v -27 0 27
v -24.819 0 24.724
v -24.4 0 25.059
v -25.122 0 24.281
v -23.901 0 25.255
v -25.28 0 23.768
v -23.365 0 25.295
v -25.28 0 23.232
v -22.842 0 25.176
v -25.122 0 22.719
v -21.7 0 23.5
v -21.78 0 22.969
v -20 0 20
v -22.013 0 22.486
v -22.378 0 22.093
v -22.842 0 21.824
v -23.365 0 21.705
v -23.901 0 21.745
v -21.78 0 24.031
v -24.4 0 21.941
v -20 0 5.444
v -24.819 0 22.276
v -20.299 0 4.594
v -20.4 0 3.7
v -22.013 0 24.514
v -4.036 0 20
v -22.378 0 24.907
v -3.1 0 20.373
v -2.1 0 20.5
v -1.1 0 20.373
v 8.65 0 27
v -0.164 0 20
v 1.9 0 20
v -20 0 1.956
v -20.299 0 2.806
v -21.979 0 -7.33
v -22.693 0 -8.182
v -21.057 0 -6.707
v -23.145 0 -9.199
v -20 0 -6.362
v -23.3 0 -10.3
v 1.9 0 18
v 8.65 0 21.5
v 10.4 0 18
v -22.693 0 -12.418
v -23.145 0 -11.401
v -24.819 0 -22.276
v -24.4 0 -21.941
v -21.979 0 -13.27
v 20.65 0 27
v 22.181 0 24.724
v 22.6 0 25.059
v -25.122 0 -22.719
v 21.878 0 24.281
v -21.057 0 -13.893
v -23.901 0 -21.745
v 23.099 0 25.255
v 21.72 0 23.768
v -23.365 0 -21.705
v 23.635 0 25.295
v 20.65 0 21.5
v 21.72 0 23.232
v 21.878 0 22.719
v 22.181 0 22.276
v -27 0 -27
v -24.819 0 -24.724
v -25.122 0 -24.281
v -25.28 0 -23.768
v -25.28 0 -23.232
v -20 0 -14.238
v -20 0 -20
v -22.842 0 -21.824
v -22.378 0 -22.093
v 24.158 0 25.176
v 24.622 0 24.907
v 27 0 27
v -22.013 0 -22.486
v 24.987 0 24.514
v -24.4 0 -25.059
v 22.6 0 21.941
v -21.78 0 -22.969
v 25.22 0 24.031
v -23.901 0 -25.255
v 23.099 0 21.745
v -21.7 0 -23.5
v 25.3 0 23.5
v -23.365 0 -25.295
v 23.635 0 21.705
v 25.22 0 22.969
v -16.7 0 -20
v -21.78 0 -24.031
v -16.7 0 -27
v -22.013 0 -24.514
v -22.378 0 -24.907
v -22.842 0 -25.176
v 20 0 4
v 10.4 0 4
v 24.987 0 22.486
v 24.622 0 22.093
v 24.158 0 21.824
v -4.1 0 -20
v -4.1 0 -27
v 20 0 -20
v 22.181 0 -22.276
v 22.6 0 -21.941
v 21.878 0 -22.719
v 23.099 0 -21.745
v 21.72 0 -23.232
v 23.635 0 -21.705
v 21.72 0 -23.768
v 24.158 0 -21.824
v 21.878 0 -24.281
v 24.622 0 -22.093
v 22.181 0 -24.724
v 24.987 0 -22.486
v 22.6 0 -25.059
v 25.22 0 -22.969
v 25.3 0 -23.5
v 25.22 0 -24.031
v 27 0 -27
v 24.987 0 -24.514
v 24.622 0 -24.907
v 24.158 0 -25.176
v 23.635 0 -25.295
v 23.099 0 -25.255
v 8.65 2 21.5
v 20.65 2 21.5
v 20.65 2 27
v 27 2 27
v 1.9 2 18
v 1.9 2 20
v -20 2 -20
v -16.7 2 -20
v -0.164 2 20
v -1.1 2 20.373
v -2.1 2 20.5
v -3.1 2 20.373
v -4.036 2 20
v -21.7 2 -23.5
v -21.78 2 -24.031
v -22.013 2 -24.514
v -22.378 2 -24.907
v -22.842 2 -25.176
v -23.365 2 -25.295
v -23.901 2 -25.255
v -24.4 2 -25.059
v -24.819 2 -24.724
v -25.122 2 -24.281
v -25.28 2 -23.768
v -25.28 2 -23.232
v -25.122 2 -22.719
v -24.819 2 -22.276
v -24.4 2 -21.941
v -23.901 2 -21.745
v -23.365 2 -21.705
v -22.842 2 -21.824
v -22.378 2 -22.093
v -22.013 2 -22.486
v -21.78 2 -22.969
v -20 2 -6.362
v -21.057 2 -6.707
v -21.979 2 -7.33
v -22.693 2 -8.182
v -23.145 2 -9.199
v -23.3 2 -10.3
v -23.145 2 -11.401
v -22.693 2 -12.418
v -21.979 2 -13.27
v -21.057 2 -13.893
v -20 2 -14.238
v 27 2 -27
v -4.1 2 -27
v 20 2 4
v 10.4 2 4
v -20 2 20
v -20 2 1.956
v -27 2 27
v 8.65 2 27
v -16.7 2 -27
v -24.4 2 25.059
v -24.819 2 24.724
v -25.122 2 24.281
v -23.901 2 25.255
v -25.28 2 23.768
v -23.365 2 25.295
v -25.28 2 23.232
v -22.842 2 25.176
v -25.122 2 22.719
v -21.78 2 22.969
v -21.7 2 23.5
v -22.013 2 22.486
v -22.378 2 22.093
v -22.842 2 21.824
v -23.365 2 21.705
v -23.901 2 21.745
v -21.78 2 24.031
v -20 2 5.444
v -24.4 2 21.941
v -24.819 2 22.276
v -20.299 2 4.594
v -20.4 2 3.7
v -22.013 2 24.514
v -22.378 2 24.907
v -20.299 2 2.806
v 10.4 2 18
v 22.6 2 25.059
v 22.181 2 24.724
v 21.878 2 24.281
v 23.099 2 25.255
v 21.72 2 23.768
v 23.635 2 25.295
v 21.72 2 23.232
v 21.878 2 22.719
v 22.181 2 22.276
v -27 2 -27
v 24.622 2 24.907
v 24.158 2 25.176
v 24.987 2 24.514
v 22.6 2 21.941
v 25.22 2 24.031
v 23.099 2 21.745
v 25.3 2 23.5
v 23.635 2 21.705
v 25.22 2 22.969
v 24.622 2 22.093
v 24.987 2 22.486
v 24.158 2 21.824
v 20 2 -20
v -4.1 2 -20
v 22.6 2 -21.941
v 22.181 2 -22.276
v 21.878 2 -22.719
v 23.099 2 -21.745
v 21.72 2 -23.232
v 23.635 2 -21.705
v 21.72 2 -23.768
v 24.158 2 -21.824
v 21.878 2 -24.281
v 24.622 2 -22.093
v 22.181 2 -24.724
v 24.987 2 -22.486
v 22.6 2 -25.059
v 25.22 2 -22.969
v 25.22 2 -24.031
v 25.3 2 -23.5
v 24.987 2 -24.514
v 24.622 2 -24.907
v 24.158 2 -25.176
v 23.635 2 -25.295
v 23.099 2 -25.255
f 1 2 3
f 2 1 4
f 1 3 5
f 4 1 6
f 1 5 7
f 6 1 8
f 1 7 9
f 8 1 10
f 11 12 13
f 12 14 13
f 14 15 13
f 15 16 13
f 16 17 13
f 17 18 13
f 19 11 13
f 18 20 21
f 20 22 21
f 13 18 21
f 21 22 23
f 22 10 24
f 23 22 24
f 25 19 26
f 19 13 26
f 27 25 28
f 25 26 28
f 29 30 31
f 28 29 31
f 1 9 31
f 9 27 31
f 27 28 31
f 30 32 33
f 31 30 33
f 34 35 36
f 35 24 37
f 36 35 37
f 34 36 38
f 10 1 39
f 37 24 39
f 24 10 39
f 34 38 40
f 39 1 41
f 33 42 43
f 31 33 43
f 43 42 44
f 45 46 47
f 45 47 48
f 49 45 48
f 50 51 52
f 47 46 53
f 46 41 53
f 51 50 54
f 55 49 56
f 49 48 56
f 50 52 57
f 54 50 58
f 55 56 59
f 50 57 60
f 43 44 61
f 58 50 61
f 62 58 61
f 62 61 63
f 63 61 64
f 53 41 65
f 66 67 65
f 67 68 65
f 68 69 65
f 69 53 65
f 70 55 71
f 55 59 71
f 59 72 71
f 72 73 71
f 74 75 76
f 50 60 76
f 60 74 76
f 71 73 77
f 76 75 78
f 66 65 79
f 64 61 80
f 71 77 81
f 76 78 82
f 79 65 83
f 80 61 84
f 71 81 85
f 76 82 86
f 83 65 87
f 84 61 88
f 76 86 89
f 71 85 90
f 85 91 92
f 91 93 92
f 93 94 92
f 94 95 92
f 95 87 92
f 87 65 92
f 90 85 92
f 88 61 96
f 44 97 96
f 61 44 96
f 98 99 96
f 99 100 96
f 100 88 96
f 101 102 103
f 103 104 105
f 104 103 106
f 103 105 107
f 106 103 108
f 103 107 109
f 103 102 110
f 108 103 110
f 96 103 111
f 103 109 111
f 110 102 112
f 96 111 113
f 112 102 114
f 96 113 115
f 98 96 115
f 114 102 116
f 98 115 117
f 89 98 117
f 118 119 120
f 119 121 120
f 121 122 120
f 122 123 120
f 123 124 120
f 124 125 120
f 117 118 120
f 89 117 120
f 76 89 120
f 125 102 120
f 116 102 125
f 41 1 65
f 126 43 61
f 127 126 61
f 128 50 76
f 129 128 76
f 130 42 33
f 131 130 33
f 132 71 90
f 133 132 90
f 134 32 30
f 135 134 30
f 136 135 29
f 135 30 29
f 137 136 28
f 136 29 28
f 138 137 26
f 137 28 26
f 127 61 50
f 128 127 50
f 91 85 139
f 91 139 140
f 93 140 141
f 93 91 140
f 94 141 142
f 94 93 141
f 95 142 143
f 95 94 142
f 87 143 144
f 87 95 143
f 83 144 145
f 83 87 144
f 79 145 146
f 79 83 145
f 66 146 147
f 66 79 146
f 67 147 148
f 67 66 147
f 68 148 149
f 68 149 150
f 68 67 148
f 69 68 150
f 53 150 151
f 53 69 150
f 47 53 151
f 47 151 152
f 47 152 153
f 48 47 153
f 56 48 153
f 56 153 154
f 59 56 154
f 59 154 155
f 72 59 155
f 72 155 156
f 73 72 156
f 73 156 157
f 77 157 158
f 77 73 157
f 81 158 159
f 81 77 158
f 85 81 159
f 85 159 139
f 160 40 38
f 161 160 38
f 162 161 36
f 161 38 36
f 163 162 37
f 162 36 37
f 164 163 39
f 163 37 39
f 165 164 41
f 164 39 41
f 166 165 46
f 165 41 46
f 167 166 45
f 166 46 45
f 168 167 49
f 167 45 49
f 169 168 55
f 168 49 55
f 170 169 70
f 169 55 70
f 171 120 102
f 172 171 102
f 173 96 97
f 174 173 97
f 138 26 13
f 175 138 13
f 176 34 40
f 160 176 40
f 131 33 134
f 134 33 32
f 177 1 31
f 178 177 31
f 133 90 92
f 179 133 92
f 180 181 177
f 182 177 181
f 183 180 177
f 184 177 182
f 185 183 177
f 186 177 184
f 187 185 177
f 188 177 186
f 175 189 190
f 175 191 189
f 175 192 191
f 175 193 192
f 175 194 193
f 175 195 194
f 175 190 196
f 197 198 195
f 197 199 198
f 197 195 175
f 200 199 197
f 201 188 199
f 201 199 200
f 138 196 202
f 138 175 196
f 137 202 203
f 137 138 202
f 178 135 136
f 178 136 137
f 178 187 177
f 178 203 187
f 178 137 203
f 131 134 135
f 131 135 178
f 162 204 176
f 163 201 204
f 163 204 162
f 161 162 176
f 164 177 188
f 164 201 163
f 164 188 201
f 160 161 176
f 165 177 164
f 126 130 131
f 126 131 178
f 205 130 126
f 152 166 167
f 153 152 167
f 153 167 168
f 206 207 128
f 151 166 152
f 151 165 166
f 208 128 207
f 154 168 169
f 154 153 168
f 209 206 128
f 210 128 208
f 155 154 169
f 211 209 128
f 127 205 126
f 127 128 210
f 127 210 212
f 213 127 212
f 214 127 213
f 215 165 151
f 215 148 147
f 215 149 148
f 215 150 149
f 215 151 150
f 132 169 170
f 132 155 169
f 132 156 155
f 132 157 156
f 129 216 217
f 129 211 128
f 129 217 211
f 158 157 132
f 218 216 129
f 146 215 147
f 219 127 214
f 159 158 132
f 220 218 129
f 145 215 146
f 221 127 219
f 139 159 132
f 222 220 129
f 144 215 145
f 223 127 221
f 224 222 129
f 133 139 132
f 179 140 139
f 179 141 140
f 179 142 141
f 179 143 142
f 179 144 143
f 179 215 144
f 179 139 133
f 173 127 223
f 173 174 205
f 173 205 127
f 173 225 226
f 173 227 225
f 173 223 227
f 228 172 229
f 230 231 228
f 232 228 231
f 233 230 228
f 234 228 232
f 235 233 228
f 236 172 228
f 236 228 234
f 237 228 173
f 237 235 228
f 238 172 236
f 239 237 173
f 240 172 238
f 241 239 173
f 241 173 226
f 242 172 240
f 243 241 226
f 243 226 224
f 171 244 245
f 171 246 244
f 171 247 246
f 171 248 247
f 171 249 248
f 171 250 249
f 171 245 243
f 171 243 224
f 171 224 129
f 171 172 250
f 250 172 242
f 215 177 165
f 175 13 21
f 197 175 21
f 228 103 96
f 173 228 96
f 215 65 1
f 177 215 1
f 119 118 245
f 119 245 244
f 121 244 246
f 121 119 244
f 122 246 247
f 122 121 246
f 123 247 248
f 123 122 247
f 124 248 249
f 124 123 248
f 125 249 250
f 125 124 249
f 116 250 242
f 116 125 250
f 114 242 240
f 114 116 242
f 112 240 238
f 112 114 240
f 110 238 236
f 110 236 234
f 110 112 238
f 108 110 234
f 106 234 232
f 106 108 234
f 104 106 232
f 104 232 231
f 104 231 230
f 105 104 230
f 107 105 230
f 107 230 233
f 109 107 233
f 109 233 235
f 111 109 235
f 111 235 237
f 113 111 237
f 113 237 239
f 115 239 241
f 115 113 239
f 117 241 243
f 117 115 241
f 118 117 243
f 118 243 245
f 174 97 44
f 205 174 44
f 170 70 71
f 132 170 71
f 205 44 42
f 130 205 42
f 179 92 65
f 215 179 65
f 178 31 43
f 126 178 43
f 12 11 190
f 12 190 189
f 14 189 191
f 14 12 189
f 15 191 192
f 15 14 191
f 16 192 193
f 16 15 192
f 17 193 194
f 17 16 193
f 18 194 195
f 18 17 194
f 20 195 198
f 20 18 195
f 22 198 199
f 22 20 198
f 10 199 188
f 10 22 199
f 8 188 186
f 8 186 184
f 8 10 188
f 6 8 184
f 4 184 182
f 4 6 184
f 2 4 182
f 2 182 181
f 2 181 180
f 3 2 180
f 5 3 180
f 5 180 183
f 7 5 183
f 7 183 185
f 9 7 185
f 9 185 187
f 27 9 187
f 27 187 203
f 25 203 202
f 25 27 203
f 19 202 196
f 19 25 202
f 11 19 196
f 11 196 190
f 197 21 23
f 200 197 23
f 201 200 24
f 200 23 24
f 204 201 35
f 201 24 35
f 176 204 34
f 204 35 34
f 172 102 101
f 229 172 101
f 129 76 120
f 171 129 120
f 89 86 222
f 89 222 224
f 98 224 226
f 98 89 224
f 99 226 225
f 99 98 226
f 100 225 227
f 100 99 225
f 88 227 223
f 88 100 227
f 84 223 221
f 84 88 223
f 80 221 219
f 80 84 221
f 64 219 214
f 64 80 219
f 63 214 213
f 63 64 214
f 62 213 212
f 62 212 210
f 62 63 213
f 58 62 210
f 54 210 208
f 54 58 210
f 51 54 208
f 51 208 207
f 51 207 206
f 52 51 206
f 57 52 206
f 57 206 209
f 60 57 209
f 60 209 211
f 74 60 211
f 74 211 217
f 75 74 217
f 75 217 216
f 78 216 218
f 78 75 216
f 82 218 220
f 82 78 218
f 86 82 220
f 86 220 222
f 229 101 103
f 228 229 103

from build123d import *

# Parameters (mm, degrees)
SKETCH_3_R      = 1.8
SKETCH_3_W      = 0.8
SKETCH_3_H      = 1.5
SKETCH_3_W_2    = 1
EXTRUDE_2_DEPTH = 2


with BuildPart() as part:
    # 草图3 → 凸台-拉伸2 (new body)
    with BuildSketch(Plane(origin=(0, 0, 0), x_dir=(1, 0, 0), z_dir=(0, 1, 0))):
        with BuildLine():
            Line((8.65, -27), (8.65, -21.5))
            Line((8.65, -21.5), (8.65, -20))
            Line((8.65, -20), (1.9, -20))
            Line((1.9, -20), (-0.163508327, -20))
            ThreePointArc((-0.163508327, -20), (-2.1, -20.5), (-4.036491673, -20))
            Line((-4.036491673, -20), (-20, -20))
            Line((-20, -20), (-20, -5.443559577))
            ThreePointArc((-20, -5.443559577), (-20.4, -3.7), (-20, -1.956440423))
            Line((-20, -1.956440423), (-20, 6.361726266))
            ThreePointArc((-20, 6.361726266), (-23.3, 10.3), (-20, 14.238273734))
            Line((-20, 14.238273734), (-20, 20))
            Line((-20, 20), (-16.7, 20))
            Line((-16.7, 20), (-16.7, 27))
            Line((-16.7, 27), (-27, 27))
            Line((-27, 27), (-27, -27))
            Line((-27, -27), (8.65, -27))
        make_face()
        with Locations((-23.5, -23.5)):
            Circle(SKETCH_3_R, mode=Mode.SUBTRACT)
        with Locations((-23.5, 23.5)):
            Circle(SKETCH_3_R, mode=Mode.SUBTRACT)
        Polygon((20, -18), (20, -20), (20.65, -20), (20.65, -21.5), (20.65, -27), (27, -27), (27, 27), (-4.1, 27), (-4.1, 20), (20, 20), (20, -4), align=None)
        with Locations((23.5, -23.5)):
            Circle(SKETCH_3_R, mode=Mode.SUBTRACT)
        with Locations((23.5, 23.5)):
            Circle(SKETCH_3_R, mode=Mode.SUBTRACT)
        Polygon((12.4, -20), (12.4, -19.5), (12.4, -18), (10.4, -18), (1.9, -18), (1.9, -20), (8.65, -20), align=None)
        Polygon((20, -20), (16.9, -20), (16.9, -19.5), (16.1, -19.5), (13.4, -19.5), (12.4, -19.5), (12.4, -20), (8.65, -20), (8.65, -21.5), (20.65, -21.5), (20.65, -20), align=None)
        Polygon((16.9, -19.5), (16.9, -20), (20, -20), (20, -18), (16.9, -18), align=None)
        with Locations((16.5, -18.75)):
            Rectangle(SKETCH_3_W, SKETCH_3_H)
        with Locations((12.9, -18.75)):
            Rectangle(SKETCH_3_W_2, SKETCH_3_H)
        Polygon((16.1, -18), (16.9, -18), (16.9, -6), (12.4, -6), (12.4, -18), (13.4, -18), (13.4, -19.5), (16.1, -19.5), align=None)
        Polygon((16.9, -18), (20, -18), (20, -4), (10.4, -4), (10.4, -6), (10.4, -18), (12.4, -18), (12.4, -6), (16.9, -6), align=None)
    extrude(amount=EXTRUDE_2_DEPTH)


solid = part.part
